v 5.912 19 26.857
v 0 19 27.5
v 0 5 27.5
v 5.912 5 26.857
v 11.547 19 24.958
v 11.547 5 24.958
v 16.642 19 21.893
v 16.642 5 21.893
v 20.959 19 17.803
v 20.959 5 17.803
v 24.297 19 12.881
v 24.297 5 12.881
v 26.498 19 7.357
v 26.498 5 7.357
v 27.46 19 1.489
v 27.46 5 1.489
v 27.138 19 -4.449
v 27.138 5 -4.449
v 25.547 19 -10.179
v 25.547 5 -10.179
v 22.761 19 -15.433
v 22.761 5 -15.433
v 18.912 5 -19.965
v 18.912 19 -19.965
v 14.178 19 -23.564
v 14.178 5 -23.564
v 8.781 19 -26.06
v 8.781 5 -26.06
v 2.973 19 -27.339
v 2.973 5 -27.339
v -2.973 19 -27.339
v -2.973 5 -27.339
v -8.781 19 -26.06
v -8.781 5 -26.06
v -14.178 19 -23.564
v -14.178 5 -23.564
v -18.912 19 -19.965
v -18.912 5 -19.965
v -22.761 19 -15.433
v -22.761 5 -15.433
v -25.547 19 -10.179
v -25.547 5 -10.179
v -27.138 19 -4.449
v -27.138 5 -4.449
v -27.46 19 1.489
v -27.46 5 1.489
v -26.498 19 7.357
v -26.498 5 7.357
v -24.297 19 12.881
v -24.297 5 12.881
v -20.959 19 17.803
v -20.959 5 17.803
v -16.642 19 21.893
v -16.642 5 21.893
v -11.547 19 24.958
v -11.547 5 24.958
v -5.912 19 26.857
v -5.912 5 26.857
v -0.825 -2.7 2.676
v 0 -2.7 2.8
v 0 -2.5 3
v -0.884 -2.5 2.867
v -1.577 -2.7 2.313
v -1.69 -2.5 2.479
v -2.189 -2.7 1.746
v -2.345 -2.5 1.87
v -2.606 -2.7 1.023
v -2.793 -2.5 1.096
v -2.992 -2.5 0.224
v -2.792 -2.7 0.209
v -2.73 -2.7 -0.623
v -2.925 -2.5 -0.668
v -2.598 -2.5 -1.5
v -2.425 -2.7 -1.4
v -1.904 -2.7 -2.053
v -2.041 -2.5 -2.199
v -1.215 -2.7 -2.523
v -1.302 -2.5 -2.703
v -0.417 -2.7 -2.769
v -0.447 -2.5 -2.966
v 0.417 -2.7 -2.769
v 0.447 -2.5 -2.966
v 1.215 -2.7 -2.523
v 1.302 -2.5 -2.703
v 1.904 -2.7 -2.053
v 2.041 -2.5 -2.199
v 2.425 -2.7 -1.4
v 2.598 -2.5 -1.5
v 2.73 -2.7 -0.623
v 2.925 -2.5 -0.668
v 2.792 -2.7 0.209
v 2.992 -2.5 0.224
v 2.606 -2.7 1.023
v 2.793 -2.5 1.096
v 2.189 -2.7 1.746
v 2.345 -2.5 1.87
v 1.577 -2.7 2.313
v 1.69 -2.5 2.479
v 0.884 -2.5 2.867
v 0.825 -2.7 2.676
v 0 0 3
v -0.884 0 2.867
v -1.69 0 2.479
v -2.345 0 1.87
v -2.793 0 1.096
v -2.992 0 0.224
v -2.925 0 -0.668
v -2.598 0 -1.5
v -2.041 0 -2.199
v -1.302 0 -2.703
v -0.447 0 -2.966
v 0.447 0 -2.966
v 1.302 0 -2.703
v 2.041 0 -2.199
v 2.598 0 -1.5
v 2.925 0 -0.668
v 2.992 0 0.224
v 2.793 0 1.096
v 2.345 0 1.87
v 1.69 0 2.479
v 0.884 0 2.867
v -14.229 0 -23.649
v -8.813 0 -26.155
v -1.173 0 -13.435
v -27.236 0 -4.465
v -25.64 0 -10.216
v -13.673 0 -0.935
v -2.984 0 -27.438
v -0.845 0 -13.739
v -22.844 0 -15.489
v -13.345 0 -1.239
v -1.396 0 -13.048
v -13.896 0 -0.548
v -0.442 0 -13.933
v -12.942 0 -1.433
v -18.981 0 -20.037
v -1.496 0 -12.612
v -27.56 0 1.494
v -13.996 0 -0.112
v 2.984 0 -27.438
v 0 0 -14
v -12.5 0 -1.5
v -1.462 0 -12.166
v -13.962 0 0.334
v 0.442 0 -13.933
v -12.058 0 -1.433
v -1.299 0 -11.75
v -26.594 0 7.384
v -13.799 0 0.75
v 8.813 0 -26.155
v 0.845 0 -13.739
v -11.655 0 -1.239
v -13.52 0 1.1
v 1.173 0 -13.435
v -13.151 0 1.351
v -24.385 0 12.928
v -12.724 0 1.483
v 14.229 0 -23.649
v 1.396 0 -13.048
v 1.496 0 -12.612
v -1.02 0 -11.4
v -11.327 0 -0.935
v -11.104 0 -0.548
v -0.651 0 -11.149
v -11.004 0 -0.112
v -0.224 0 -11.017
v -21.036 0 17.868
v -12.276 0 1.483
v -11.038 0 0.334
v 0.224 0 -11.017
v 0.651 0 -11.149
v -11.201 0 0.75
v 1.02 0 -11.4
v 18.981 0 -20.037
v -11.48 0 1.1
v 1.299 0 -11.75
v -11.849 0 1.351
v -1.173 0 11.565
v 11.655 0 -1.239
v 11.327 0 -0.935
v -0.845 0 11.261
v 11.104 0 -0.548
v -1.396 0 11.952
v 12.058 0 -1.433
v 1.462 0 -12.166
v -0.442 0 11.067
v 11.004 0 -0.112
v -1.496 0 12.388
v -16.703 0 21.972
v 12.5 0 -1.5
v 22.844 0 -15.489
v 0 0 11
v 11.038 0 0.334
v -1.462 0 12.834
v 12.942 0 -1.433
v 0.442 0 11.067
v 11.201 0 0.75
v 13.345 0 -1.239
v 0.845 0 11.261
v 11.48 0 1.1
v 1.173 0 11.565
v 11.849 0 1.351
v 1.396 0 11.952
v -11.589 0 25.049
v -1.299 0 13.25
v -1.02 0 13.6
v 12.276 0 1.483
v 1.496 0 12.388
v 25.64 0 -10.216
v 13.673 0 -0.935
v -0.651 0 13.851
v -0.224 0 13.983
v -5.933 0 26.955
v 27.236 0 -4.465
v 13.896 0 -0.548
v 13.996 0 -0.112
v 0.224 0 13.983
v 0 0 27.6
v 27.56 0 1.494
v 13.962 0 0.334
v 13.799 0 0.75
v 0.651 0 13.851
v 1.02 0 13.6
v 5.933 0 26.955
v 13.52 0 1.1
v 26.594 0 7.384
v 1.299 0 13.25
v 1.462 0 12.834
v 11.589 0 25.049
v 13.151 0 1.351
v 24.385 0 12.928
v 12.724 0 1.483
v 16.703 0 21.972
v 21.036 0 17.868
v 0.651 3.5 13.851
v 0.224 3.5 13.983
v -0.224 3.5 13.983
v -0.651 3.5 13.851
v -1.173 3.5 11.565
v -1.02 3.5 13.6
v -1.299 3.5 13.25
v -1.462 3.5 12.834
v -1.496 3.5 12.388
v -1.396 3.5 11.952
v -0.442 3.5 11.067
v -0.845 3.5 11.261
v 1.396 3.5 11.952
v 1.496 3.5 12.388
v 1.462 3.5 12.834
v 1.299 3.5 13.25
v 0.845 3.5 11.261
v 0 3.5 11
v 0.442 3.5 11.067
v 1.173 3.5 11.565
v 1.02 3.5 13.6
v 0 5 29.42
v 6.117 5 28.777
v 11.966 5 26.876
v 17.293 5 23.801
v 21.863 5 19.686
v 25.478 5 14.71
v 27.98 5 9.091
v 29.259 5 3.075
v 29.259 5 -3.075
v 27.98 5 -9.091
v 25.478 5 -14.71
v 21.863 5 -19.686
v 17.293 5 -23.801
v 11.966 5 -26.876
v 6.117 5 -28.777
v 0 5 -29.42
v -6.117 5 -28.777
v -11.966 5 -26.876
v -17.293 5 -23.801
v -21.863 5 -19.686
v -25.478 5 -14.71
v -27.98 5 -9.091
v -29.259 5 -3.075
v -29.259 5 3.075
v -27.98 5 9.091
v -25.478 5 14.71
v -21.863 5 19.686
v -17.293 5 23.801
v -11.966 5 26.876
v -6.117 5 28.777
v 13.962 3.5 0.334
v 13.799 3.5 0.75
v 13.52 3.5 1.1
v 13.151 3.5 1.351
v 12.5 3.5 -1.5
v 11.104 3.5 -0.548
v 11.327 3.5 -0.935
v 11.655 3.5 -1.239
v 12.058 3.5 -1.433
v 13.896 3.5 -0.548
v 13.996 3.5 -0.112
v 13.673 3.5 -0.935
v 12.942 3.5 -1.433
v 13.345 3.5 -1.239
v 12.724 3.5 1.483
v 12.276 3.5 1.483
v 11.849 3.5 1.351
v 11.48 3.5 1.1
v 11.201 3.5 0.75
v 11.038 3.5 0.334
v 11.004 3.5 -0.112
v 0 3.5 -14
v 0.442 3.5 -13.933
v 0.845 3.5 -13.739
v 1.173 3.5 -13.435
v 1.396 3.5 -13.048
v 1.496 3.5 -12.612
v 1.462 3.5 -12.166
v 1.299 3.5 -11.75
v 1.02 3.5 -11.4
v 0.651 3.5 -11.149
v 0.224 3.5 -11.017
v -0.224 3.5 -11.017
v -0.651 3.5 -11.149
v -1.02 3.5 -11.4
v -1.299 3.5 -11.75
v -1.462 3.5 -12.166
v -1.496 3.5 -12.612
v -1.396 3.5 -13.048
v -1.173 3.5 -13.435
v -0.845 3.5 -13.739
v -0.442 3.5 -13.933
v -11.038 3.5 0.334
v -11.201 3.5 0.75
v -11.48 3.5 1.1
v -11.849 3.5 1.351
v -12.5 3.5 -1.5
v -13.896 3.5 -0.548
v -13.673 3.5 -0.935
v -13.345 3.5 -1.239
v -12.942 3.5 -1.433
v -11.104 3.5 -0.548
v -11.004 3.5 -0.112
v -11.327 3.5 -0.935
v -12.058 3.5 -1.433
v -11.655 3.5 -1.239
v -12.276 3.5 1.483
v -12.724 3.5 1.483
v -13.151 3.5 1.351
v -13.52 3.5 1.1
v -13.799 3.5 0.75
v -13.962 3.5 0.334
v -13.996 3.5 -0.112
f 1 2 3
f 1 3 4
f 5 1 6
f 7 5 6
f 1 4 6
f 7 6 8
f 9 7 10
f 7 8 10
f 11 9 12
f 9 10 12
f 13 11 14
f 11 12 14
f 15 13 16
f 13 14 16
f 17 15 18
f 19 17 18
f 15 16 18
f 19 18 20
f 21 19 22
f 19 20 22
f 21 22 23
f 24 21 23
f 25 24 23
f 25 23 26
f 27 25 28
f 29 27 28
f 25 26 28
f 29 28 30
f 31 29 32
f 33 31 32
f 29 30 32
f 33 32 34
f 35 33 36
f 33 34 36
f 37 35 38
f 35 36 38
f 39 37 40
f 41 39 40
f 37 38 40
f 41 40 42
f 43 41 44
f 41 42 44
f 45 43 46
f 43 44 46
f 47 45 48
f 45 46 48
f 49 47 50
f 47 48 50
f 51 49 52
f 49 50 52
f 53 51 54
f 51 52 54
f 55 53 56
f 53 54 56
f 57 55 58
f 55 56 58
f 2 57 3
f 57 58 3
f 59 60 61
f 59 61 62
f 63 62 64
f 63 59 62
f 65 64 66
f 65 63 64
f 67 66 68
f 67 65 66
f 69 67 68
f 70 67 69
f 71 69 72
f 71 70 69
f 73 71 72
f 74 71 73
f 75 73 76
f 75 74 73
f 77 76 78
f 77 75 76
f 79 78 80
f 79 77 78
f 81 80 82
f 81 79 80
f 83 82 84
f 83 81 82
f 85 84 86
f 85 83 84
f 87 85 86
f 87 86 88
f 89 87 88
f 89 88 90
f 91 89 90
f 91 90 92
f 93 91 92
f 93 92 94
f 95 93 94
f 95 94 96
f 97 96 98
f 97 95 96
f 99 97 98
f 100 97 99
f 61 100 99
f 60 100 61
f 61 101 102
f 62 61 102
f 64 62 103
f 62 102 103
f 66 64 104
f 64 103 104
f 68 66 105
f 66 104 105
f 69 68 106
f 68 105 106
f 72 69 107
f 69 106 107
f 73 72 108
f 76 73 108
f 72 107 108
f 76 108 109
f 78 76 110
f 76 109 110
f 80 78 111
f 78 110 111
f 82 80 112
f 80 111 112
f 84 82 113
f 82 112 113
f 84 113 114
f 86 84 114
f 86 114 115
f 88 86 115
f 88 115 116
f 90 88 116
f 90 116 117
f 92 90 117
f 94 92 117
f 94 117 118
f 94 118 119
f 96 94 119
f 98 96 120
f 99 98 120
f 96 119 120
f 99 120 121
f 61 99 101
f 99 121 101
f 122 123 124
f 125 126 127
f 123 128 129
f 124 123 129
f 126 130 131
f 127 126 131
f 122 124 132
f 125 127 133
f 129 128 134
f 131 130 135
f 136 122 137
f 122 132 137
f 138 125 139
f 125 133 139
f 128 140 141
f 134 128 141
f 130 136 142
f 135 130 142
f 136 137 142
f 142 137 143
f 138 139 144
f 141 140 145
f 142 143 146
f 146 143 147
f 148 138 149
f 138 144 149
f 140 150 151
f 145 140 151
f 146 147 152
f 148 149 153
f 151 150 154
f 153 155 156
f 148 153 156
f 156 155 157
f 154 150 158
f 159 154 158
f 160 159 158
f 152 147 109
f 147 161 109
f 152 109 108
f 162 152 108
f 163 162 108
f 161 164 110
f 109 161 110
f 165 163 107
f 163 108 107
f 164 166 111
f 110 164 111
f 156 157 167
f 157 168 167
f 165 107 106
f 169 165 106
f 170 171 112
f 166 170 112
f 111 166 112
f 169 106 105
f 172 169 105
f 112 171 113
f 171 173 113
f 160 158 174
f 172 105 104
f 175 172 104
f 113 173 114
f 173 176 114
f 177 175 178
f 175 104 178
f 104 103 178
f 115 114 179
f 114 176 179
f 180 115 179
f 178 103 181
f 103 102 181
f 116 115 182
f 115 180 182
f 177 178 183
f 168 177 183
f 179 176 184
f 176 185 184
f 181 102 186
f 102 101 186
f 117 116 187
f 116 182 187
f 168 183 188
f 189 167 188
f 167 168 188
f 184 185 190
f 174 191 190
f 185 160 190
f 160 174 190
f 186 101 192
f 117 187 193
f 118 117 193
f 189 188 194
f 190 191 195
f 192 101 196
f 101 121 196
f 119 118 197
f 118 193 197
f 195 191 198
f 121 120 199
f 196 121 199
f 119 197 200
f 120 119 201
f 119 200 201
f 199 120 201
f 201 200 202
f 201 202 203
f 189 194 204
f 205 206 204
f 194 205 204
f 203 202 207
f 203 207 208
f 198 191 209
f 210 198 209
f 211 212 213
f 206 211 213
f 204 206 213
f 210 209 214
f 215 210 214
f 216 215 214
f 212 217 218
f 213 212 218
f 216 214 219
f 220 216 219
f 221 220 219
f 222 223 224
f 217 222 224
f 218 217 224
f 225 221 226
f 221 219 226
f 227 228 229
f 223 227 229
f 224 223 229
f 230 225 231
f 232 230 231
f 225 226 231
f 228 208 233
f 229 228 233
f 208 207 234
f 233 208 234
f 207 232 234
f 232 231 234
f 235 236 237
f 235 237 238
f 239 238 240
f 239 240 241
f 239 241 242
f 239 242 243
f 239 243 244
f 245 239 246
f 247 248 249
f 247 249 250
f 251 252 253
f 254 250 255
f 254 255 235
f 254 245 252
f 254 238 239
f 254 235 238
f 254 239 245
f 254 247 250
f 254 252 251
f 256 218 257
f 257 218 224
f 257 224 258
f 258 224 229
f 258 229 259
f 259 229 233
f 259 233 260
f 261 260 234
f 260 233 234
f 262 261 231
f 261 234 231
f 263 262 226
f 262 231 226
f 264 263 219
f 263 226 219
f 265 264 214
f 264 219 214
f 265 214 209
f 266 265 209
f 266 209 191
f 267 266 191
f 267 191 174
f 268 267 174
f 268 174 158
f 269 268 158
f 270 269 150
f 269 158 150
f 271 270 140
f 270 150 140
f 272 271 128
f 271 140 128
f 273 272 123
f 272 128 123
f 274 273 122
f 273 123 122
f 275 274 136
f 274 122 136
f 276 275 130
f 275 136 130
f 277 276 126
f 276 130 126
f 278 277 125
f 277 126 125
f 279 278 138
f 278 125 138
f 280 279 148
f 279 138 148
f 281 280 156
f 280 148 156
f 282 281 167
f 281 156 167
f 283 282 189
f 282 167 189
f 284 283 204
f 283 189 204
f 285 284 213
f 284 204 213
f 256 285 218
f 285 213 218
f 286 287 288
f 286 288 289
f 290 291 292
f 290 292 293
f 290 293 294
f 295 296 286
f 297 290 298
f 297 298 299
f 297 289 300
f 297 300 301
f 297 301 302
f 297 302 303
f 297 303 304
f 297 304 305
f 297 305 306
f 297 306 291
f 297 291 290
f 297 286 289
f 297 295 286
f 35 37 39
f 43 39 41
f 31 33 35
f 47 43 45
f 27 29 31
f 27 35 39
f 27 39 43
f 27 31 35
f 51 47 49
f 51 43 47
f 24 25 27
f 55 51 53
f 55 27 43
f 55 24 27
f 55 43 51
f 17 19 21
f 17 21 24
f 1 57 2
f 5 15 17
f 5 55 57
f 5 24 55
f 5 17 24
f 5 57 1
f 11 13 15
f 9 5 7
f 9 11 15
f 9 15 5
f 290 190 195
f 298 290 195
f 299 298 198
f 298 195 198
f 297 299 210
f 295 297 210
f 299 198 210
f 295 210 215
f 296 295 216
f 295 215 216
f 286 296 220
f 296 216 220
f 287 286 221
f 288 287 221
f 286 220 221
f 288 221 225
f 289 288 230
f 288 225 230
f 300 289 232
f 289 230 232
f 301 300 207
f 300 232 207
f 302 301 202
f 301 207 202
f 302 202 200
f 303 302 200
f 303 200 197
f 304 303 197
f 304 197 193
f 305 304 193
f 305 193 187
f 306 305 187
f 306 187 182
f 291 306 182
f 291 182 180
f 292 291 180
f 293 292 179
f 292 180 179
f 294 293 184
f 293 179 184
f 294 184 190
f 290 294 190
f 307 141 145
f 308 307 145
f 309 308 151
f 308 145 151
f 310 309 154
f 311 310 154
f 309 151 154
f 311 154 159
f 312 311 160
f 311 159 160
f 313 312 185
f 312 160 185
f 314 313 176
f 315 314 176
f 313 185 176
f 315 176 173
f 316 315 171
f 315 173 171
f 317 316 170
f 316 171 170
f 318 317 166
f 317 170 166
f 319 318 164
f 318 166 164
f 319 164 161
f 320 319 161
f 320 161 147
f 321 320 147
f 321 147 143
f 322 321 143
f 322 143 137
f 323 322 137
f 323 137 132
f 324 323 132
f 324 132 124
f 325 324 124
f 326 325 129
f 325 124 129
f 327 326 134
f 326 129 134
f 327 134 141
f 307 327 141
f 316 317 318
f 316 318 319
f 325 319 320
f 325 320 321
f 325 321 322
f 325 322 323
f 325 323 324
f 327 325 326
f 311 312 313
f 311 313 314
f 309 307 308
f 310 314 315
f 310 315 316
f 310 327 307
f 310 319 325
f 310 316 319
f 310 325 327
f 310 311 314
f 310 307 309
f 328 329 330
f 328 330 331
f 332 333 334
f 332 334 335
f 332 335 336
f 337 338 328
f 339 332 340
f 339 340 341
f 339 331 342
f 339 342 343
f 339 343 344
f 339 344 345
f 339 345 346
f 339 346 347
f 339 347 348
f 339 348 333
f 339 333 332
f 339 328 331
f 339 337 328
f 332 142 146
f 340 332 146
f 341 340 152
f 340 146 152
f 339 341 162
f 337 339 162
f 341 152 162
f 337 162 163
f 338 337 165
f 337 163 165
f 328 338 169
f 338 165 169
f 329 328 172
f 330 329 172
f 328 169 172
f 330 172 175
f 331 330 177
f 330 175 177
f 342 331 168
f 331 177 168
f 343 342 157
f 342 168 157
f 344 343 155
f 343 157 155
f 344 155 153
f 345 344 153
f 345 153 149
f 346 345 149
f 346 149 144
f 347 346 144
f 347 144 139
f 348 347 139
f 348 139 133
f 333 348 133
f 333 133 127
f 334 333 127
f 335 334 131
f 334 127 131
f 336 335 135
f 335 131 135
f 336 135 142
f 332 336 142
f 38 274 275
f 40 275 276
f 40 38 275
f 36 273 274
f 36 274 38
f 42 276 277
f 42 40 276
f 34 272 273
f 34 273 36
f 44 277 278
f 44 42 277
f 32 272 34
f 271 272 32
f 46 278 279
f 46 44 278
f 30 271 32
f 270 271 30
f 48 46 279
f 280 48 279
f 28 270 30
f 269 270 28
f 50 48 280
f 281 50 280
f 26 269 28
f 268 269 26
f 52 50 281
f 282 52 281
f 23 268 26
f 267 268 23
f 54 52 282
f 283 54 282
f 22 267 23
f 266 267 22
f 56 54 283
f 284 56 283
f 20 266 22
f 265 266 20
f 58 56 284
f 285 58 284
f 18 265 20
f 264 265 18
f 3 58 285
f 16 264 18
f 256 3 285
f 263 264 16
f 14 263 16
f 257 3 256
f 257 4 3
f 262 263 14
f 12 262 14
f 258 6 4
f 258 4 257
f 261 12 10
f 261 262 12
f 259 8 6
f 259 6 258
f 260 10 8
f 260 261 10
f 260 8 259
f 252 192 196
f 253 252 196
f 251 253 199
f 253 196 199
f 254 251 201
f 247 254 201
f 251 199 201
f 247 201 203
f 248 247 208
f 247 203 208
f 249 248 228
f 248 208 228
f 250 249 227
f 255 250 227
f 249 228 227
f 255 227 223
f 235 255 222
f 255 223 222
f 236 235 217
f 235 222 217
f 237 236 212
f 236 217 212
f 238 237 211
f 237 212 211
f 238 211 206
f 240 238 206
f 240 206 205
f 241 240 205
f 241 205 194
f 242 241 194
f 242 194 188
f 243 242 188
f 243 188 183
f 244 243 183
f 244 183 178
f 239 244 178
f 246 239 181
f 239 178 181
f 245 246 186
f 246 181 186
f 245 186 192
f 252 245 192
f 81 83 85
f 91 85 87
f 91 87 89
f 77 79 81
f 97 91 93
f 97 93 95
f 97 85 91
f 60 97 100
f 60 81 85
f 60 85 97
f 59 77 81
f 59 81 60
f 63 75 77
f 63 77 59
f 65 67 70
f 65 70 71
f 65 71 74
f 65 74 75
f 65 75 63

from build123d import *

# Parameters (mm, degrees)
SKETCH1_R           = 29.5
BOSS_EXTRUDE1_DEPTH = 5
SKETCH2_R           = 27.5
BOSS_EXTRUDE2_DEPTH = 14
CHAMFER1_SIZE       = 5.220207097
CHAMFER1_SIZE_2     = 1.9
SKETCH3_R           = 1.5
CUT_EXTRUDE1_DEPTH  = 3.5
SKETCH4_R           = 3
BOSS_EXTRUDE3_DEPTH = 2.7
CHAMFER2_SIZE       = 0.2


with BuildPart() as part:
    # Sketch1 → Boss-Extrude1 (new body)
    with BuildSketch(Plane(origin=(0, 0, 0), x_dir=(1, 0, 0), z_dir=(0, 1, 0))):
        with Locations(Location((0, 0, 0), (0, 0, 270))):
            Circle(SKETCH1_R)
    extrude(amount=BOSS_EXTRUDE1_DEPTH)

    # Sketch2 → Boss-Extrude2 (add)
    with BuildSketch(Plane(origin=(0, 5, 0), x_dir=(1, 0, 0), z_dir=(0, 1, 0))):
        with Locations(Location((0, 0, 0), (0, 0, 270))):
            Circle(SKETCH2_R)
    extrude(amount=BOSS_EXTRUDE2_DEPTH)

    # Chamfer1
    # the kernel refuses this chamfer: 5.220207097, 1.9 mm, written as the material it takes off along each edge
    with BuildSketch(Plane(origin=(0, 0, 0), x_dir=(0, 0, 1), z_dir=(-1, 0, 0))) as chamfer1_piece_1:
        Polygon((29.5, CHAMFER1_SIZE), (29.5 - CHAMFER1_SIZE_2, 0), (29.5, 0), align=None)
    revolve(axis=Axis((0, 0, 0), (0, 1, 0)), mode=Mode.SUBTRACT)

    # Sketch3 → Cut-Extrude1 (cut)
    with BuildSketch(Plane.XZ):
        with Locations(Location((0, 12.5, 0), (0, 0, 270))):
            Circle(SKETCH3_R)
        with Locations(Location((12.5, 0, 0), (0, 0, 270))):
            Circle(SKETCH3_R)
        with Locations(Location((0, -12.5, 0), (0, 0, 270))):
            Circle(SKETCH3_R)
        with Locations(Location((-12.5, 0, 0), (0, 0, 270))):
            Circle(SKETCH3_R)
    extrude(amount=-CUT_EXTRUDE1_DEPTH, mode=Mode.SUBTRACT)

    # Sketch4 → Boss-Extrude3 (add)
    with BuildSketch(Plane.XZ):
        with Locations(Location((0, 0, 0), (0, 0, 90))):
            Circle(SKETCH4_R)
    extrude(amount=BOSS_EXTRUDE3_DEPTH)

    # Chamfer2
    chamfer2_edges = [part.edges().sort_by_distance(p)[0] for p in [
        (0, -2.7, -3),
    ]]
    chamfer(chamfer2_edges, length=CHAMFER2_SIZE)


solid = part.part
